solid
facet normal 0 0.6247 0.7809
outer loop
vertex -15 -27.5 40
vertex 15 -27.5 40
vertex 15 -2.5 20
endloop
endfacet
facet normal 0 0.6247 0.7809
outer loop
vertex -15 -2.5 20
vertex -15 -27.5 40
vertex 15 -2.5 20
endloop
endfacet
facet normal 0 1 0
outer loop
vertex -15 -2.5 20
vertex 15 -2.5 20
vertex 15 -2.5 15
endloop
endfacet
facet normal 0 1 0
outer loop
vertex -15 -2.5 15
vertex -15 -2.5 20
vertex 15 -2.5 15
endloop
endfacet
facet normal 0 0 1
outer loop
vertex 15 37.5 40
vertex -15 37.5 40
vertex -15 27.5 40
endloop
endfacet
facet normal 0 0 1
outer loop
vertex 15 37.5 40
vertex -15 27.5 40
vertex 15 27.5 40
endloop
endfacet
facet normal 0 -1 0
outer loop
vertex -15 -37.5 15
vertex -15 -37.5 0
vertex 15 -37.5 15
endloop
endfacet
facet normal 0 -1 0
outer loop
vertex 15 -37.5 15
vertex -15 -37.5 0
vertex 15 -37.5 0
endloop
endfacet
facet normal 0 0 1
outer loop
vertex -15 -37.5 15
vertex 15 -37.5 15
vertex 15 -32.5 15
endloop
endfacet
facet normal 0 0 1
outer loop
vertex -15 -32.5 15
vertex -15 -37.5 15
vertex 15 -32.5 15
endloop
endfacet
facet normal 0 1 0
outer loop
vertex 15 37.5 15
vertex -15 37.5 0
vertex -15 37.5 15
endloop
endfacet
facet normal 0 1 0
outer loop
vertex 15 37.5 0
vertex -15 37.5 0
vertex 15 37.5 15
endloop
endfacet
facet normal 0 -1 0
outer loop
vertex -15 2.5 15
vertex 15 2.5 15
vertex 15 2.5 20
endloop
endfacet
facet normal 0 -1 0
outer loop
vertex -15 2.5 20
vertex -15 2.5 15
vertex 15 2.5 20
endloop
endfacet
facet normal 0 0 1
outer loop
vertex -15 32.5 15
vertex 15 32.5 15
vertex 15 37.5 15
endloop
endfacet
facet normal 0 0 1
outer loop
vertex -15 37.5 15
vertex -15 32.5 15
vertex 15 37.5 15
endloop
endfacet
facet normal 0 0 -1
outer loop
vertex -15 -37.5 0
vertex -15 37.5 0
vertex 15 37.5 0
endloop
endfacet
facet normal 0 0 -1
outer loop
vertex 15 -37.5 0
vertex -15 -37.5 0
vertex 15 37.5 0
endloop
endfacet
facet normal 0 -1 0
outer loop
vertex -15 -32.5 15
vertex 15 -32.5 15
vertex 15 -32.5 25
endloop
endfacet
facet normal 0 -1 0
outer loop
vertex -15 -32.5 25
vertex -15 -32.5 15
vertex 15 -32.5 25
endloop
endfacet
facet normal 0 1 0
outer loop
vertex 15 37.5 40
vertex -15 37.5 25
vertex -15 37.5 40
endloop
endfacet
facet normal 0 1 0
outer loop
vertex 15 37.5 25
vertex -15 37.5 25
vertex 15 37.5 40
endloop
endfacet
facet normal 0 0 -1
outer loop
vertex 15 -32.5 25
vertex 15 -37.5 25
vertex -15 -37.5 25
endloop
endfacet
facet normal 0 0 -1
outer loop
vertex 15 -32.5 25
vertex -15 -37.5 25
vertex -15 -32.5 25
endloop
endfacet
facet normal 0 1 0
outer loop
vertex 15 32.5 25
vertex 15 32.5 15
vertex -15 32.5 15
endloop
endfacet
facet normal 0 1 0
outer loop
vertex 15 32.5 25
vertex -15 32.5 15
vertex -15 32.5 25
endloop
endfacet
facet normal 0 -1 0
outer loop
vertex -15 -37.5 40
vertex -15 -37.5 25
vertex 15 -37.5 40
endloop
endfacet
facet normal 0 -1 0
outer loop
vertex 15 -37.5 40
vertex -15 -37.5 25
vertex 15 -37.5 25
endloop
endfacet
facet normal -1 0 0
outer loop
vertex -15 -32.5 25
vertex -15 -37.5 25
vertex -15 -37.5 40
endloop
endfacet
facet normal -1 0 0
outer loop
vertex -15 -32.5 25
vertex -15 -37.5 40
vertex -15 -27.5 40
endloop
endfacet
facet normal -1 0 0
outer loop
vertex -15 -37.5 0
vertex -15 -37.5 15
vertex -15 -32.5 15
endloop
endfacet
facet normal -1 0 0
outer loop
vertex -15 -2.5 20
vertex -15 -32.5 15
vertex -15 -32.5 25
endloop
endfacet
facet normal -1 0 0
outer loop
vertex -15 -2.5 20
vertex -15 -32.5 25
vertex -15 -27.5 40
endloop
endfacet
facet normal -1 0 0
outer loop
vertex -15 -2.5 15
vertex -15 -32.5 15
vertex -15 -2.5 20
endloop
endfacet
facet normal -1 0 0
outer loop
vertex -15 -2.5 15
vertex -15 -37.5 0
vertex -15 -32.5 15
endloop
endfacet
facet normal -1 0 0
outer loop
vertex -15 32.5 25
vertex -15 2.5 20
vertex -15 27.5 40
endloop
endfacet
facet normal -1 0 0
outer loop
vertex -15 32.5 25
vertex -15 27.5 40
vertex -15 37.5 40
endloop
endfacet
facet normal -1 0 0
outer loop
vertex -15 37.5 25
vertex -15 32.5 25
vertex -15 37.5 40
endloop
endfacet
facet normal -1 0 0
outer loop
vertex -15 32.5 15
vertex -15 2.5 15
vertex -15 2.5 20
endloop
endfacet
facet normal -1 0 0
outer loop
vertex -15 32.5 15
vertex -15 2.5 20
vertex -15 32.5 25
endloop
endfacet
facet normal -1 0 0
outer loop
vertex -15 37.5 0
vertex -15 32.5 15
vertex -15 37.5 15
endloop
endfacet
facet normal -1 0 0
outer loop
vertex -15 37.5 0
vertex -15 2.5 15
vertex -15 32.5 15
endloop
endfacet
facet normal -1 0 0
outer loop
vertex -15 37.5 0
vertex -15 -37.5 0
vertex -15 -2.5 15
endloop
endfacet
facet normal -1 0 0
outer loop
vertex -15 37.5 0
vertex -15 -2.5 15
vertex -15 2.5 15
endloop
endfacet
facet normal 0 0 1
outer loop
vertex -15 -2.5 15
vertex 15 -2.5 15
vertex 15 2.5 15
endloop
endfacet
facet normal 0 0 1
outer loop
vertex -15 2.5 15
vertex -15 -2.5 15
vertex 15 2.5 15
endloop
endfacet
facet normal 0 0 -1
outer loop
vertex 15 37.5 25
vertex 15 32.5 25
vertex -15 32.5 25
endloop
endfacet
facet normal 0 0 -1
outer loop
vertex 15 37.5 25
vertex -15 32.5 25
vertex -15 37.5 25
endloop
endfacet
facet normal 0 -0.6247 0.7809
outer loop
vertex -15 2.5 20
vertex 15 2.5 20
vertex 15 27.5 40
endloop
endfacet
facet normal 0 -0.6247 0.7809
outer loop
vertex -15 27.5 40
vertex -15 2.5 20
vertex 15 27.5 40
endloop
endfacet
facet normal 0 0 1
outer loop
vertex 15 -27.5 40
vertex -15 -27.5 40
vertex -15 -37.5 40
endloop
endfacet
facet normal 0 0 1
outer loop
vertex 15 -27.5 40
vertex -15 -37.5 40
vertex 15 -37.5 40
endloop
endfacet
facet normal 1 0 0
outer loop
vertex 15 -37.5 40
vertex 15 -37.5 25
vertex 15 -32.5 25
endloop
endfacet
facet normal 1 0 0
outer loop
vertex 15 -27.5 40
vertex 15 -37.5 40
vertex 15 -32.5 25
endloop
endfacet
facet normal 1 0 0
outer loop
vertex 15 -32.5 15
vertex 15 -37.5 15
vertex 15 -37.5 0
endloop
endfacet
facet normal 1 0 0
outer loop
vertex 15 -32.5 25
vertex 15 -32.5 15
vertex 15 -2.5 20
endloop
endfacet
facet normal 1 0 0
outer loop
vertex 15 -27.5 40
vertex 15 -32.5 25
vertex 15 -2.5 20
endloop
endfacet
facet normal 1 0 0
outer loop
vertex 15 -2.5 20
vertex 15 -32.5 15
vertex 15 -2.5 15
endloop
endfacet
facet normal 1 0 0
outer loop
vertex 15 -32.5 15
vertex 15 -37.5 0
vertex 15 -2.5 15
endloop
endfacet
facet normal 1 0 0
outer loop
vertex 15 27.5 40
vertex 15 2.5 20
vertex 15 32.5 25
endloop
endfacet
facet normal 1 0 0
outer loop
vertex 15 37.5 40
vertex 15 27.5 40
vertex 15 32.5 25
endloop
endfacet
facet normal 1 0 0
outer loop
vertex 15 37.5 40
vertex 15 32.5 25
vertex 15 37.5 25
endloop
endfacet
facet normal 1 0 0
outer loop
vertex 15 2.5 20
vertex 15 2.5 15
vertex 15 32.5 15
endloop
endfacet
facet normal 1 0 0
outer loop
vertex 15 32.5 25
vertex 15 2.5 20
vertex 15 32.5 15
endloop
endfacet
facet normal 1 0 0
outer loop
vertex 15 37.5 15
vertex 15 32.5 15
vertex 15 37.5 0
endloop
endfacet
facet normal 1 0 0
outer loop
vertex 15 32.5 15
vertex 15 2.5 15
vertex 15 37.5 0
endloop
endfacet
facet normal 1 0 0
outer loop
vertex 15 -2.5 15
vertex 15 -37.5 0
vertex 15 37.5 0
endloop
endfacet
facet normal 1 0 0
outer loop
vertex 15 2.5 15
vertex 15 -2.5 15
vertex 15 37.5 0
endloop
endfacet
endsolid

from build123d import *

# Parameters (mm, degrees)
F0_W     = 30
F0_H     = 75
F1_DEPTH = 40
F2_W     = 5
F2_H     = 10
F3_DEPTH = 30.001


with BuildPart() as f1:
    # F0 (on Top) → F1 (new body)
    with BuildSketch(Plane.XY):
        Rectangle(F0_W, F0_H)
    extrude(amount=F1_DEPTH)

    # F2 (on face) → F3 (cut, through all)
    with BuildSketch(Plane.YZ.offset(15)):
        with Locations((-35, 20)):
            Rectangle(F2_W, F2_H)
        with Locations((35, 20)):
            Rectangle(F2_W, F2_H)
        Polygon((-2.5, 20), (-2.5, 15), (2.5, 15), (2.5, 20), (27.5, 40), (-27.5, 40), align=None)
    extrude(amount=-F3_DEPTH, mode=Mode.SUBTRACT)


solid = f1.part
